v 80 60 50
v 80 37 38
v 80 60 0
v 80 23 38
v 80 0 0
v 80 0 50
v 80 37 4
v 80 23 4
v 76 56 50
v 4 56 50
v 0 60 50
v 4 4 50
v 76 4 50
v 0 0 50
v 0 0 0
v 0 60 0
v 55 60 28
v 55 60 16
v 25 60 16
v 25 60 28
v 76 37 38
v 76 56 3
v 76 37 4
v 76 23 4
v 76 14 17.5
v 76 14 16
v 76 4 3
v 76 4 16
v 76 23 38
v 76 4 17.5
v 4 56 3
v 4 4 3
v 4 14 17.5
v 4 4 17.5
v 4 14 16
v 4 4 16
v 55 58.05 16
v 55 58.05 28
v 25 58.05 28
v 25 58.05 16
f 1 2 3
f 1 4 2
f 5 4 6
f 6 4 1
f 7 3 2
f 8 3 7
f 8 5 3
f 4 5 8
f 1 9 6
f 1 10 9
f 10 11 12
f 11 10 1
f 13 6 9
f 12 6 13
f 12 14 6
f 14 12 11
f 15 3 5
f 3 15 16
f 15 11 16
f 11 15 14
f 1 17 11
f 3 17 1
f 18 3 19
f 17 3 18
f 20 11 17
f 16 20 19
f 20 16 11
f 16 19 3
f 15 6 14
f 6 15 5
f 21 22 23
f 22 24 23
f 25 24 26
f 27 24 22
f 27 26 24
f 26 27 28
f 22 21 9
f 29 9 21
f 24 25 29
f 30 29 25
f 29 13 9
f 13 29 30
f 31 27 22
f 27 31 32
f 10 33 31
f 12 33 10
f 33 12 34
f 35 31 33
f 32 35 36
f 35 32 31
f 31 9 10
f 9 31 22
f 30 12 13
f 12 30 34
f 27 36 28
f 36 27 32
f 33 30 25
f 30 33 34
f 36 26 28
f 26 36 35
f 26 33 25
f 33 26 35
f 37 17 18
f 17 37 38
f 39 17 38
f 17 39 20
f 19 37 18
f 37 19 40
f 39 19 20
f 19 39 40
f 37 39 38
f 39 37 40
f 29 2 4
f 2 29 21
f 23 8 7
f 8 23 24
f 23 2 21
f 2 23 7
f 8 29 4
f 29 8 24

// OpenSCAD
// ==========================================
// Parametric Rectangular Enclosure
// ==========================================

// Global resolution for curves
$fn = 100;

// --- Main Body Parameters ---
outer_width  = 80;   // X dimension
outer_depth  = 60;   // Y dimension
outer_height = 50;   // Z dimension
wall_thk     = 4;    // Side wall thickness
floor_thk    = 3;    // Bottom floor thickness

// --- Front Wall Feature: Horizontal Recess ---
recess_w     = 30;   // Width along X
recess_h     = 12;   // Height along Z
recess_d     = 2;    // Depth into wall (Y)
recess_z     = 22;   // Center height from bottom

// --- Right Wall Feature: Vertical Through Opening ---
slot_w       = 14;   // Width along Y
slot_h       = 34;   // Height along Z
slot_z_base  = 4;    // Starting height from bottom

// --- Interior Feature: Thin Ledge/Rib ---
ledge_thk    = 1.5;  // Thickness along Z
ledge_ext    = 10;   // Extent into interior along Y
ledge_z      = 16;   // Height from floor

// ==========================================
// Modeling Steps
// ==========================================

difference() {
    // Union combines the main shell with the interior ledge
    union() {
        // Step 1: Create outer box and subtract hollow interior (open top)
        difference() {
            cube([outer_width, outer_depth, outer_height]);
            // Inner cavity extends +1mm past top to ensure clean open face
            translate([wall_thk, wall_thk, floor_thk])
                cube([outer_width - 2*wall_thk, outer_depth - 2*wall_thk, outer_height - floor_thk + 1]);
        }

        // Step 2: Add thin interior ledge/rib attached to the back inner wall
        translate([wall_thk, wall_thk, ledge_z])
            cube([outer_width - 2*wall_thk, ledge_ext, ledge_thk]);
    }

    // Step 3: Subtract horizontal recess from front wall
    // Positioned to cut inward from the outer face (+0.05/0.1 prevents coplanar faces)
    translate([
        outer_width/2 - recess_w/2,
        outer_depth - recess_d + 0.05,
        recess_z - recess_h/2
    ])
    cube([recess_w, recess_d + 0.1, recess_h]);

    // Step 4: Subtract vertical through-opening from right wall
    // Spans full wall thickness to create a clean slot
    translate([
        outer_width - wall_thk - 0.05,
        outer_depth/2 - slot_w/2,
        slot_z_base
    ])
    cube([wall_thk + 0.1, slot_w, slot_h]);
}
